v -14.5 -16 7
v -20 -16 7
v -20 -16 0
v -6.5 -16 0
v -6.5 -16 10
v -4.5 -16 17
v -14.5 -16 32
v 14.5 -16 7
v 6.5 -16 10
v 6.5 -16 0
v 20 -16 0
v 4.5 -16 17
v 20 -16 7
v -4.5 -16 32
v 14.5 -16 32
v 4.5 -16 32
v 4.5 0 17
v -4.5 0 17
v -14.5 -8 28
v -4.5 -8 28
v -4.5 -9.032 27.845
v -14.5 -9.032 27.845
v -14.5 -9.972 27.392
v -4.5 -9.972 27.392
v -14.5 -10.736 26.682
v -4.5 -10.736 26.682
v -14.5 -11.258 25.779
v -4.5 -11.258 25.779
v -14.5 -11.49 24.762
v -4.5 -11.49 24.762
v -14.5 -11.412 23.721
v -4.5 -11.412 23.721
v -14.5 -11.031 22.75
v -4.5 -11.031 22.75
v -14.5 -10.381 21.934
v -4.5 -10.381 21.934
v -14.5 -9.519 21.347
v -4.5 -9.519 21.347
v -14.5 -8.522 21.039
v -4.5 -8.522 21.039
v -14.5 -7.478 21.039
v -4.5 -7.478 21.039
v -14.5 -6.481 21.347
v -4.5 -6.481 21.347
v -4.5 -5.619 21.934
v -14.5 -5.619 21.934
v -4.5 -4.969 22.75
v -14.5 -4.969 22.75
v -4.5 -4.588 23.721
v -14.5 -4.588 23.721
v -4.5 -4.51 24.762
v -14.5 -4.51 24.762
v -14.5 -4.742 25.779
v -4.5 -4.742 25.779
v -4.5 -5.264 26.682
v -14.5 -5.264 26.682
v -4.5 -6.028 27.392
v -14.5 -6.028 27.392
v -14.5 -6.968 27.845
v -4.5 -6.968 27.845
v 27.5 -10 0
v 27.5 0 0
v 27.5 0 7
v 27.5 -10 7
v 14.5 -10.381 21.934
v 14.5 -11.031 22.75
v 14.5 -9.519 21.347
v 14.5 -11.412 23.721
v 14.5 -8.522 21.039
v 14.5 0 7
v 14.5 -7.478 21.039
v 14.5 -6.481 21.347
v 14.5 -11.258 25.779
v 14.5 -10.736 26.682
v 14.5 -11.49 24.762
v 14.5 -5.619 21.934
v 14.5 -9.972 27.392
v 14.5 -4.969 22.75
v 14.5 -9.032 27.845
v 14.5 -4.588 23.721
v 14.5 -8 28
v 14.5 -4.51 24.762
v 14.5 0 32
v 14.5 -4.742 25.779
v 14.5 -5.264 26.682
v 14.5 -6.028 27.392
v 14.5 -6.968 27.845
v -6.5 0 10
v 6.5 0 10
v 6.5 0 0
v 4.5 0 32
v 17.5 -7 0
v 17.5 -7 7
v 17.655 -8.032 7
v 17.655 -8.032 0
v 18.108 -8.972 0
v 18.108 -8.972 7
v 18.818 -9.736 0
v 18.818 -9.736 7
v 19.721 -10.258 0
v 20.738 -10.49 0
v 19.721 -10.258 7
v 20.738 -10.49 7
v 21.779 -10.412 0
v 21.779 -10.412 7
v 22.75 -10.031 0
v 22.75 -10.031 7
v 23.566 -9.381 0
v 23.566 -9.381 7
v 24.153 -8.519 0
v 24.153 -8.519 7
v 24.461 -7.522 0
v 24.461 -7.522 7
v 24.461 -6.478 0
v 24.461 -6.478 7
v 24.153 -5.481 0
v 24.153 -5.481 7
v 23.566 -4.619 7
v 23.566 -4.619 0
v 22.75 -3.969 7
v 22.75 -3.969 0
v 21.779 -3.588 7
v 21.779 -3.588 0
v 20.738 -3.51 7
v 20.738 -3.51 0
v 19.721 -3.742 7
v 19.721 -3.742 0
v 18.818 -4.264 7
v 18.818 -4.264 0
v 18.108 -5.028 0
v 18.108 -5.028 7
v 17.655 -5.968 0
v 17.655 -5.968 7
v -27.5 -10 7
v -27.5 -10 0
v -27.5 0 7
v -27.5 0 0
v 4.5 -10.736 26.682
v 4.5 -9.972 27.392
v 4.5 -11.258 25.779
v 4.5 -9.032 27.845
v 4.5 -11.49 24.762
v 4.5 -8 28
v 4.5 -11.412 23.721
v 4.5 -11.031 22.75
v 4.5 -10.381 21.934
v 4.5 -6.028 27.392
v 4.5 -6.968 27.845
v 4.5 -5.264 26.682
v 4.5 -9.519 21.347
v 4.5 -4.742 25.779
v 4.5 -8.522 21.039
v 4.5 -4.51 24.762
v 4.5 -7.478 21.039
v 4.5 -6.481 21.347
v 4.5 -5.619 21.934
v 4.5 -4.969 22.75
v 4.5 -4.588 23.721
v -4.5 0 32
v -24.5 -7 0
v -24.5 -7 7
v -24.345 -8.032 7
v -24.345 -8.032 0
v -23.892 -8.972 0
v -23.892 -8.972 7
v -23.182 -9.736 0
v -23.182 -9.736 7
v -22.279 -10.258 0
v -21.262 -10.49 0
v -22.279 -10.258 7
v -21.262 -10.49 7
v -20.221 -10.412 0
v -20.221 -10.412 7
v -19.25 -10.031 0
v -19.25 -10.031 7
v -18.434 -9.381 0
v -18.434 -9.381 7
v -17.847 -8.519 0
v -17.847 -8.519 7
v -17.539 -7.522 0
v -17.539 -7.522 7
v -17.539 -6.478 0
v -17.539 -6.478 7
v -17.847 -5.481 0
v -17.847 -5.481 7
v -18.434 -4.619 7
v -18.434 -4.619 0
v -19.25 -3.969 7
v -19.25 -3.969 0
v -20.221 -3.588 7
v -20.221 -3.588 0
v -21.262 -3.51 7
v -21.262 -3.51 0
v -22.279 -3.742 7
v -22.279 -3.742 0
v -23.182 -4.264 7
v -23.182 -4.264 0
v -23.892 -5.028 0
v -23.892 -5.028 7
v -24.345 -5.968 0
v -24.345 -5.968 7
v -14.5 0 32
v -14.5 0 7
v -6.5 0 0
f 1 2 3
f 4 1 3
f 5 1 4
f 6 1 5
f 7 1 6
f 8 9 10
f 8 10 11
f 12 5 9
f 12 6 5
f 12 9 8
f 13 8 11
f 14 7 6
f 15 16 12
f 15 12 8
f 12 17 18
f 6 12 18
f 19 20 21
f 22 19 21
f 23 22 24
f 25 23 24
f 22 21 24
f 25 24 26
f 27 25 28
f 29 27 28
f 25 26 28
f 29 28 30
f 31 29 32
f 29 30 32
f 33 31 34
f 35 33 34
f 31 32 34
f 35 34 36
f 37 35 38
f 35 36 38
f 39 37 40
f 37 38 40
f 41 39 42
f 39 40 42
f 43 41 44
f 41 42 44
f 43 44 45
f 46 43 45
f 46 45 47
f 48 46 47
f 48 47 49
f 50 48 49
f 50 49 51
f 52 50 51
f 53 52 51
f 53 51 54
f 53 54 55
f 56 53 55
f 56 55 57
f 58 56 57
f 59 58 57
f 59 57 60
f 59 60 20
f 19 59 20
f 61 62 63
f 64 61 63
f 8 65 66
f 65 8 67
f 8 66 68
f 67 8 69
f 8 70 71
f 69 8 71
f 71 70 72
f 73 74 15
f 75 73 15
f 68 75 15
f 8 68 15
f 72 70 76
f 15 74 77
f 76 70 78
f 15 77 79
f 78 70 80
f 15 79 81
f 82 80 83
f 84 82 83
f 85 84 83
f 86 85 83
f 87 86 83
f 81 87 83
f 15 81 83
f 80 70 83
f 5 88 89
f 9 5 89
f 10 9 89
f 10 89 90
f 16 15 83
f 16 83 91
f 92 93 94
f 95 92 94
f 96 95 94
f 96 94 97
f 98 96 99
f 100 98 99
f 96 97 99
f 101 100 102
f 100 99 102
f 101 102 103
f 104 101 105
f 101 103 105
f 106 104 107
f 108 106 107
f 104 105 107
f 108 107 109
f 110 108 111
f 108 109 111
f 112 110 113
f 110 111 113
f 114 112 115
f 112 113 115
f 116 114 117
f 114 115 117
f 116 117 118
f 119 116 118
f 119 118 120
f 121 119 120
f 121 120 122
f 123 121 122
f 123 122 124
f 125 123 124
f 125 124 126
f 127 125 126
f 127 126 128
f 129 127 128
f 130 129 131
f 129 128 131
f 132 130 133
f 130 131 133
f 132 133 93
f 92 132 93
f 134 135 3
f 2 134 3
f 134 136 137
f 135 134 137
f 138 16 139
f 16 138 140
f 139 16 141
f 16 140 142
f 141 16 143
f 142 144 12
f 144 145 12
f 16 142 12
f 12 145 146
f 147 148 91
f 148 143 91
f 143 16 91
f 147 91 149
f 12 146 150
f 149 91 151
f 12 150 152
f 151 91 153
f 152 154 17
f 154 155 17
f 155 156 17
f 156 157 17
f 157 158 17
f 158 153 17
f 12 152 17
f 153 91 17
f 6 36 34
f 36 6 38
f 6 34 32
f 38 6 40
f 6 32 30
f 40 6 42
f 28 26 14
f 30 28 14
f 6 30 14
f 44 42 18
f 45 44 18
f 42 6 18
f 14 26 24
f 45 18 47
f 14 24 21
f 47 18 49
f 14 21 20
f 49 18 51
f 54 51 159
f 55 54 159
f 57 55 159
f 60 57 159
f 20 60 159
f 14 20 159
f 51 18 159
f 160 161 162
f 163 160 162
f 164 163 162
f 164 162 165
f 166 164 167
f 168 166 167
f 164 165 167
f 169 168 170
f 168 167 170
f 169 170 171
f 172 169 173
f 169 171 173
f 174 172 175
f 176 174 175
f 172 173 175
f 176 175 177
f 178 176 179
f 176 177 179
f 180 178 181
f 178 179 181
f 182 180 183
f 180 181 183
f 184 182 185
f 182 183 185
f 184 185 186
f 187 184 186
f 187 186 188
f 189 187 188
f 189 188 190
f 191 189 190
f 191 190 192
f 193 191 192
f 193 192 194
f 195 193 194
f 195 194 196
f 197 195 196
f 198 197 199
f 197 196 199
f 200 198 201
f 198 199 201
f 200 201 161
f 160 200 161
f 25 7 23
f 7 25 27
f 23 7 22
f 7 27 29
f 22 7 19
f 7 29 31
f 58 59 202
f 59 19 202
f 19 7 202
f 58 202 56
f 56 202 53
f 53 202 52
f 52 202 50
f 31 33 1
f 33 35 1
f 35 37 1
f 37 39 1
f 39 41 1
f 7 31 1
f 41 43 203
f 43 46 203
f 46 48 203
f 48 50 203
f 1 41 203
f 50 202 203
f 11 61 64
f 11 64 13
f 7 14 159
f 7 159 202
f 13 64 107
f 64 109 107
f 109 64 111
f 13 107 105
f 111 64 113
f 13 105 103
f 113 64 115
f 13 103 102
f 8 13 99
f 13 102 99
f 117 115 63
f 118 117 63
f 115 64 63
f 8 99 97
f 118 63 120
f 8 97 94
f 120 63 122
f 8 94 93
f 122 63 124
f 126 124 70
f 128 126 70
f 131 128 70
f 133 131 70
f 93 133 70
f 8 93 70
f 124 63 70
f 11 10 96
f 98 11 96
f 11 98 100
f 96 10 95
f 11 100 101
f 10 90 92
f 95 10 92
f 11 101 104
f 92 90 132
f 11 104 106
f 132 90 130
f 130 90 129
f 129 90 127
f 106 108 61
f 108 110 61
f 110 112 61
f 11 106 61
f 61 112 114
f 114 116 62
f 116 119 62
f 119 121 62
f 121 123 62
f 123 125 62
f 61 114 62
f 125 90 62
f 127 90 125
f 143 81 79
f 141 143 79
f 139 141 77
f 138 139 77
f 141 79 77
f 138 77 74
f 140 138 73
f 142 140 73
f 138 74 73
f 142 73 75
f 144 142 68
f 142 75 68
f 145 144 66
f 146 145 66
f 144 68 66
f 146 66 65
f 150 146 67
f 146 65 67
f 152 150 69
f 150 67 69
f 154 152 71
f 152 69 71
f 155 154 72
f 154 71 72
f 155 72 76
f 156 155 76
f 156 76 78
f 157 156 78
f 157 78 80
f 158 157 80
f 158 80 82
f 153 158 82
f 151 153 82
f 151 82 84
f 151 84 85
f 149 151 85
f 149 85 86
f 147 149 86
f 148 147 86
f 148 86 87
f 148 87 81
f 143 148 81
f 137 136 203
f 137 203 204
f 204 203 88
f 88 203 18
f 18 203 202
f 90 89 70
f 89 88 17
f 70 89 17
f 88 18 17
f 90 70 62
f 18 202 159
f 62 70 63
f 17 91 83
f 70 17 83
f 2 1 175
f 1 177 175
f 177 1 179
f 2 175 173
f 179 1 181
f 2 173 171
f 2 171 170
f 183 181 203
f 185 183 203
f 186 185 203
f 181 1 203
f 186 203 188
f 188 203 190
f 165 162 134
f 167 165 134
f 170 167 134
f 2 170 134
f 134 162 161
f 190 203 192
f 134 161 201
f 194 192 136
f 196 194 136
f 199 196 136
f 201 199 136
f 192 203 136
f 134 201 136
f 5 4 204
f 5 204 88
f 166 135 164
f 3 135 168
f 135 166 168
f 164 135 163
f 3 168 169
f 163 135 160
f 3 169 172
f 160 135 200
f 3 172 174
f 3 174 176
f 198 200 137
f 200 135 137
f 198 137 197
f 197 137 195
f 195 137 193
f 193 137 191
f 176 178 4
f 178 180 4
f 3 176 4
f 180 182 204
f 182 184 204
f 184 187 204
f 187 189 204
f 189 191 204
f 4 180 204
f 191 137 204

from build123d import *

# Parameters (mm, degrees)
PAD_DEPTH       = 16
POCKET_DEPTH    = 7
SKETCH002_R     = 3.5
POCKET001_DEPTH = 42.001
SKETCH003_R     = 3.5
POCKET002_DEPTH = 7


with BuildPart() as part:
    # Sketch → Pad (new body)
    with BuildSketch(Plane.XZ):
        Polygon((-27.5, 7), (-27.5, 0), (-6.5, 0), (-6.5, 10), (6.5, 10), (6.5, 0), (27.5, 0), (27.5, 7), (14.5, 7), (14.5, 32), (4.5, 32), (4.5, 17), (-4.5, 17), (-4.5, 32), (-14.5, 32), (-14.5, 7), align=None)
    extrude(amount=PAD_DEPTH)

    # Sketch001 (on Face6 of Pad) → Pocket (cut)
    with BuildSketch(Plane(origin=(0, 0, 0), x_dir=(1, 0, 0), z_dir=(0, 0, -1))):
        Polygon((-27.5, 16), (-27.5, 10), (-20, 16), align=None)
        Polygon((20, 16), (27.5, 16), (27.5, 10), align=None)
    extrude(amount=-POCKET_DEPTH, mode=Mode.SUBTRACT)

    # Sketch002 (on Face12 of Pocket) → Pocket001 (cut, through all)
    with BuildSketch(Plane(origin=(14.5, 0, 0), x_dir=(0, 0, 1), z_dir=(1, 0, 0))):
        with Locations((24.5, 8)):
            Circle(SKETCH002_R)
    extrude(amount=-POCKET001_DEPTH, mode=Mode.SUBTRACT)

    # Sketch003 (on Face11 of Pocket001) → Pocket002 (cut)
    with BuildSketch(Plane(origin=(0, 0, 7), x_dir=(-1, 0, 0), z_dir=(0, 0, 1))):
        with Locations((21, 7)):
            Circle(SKETCH003_R)
        with Locations((-21, 7)):
            Circle(SKETCH003_R)
    extrude(amount=-POCKET002_DEPTH, mode=Mode.SUBTRACT)


solid = part.part
